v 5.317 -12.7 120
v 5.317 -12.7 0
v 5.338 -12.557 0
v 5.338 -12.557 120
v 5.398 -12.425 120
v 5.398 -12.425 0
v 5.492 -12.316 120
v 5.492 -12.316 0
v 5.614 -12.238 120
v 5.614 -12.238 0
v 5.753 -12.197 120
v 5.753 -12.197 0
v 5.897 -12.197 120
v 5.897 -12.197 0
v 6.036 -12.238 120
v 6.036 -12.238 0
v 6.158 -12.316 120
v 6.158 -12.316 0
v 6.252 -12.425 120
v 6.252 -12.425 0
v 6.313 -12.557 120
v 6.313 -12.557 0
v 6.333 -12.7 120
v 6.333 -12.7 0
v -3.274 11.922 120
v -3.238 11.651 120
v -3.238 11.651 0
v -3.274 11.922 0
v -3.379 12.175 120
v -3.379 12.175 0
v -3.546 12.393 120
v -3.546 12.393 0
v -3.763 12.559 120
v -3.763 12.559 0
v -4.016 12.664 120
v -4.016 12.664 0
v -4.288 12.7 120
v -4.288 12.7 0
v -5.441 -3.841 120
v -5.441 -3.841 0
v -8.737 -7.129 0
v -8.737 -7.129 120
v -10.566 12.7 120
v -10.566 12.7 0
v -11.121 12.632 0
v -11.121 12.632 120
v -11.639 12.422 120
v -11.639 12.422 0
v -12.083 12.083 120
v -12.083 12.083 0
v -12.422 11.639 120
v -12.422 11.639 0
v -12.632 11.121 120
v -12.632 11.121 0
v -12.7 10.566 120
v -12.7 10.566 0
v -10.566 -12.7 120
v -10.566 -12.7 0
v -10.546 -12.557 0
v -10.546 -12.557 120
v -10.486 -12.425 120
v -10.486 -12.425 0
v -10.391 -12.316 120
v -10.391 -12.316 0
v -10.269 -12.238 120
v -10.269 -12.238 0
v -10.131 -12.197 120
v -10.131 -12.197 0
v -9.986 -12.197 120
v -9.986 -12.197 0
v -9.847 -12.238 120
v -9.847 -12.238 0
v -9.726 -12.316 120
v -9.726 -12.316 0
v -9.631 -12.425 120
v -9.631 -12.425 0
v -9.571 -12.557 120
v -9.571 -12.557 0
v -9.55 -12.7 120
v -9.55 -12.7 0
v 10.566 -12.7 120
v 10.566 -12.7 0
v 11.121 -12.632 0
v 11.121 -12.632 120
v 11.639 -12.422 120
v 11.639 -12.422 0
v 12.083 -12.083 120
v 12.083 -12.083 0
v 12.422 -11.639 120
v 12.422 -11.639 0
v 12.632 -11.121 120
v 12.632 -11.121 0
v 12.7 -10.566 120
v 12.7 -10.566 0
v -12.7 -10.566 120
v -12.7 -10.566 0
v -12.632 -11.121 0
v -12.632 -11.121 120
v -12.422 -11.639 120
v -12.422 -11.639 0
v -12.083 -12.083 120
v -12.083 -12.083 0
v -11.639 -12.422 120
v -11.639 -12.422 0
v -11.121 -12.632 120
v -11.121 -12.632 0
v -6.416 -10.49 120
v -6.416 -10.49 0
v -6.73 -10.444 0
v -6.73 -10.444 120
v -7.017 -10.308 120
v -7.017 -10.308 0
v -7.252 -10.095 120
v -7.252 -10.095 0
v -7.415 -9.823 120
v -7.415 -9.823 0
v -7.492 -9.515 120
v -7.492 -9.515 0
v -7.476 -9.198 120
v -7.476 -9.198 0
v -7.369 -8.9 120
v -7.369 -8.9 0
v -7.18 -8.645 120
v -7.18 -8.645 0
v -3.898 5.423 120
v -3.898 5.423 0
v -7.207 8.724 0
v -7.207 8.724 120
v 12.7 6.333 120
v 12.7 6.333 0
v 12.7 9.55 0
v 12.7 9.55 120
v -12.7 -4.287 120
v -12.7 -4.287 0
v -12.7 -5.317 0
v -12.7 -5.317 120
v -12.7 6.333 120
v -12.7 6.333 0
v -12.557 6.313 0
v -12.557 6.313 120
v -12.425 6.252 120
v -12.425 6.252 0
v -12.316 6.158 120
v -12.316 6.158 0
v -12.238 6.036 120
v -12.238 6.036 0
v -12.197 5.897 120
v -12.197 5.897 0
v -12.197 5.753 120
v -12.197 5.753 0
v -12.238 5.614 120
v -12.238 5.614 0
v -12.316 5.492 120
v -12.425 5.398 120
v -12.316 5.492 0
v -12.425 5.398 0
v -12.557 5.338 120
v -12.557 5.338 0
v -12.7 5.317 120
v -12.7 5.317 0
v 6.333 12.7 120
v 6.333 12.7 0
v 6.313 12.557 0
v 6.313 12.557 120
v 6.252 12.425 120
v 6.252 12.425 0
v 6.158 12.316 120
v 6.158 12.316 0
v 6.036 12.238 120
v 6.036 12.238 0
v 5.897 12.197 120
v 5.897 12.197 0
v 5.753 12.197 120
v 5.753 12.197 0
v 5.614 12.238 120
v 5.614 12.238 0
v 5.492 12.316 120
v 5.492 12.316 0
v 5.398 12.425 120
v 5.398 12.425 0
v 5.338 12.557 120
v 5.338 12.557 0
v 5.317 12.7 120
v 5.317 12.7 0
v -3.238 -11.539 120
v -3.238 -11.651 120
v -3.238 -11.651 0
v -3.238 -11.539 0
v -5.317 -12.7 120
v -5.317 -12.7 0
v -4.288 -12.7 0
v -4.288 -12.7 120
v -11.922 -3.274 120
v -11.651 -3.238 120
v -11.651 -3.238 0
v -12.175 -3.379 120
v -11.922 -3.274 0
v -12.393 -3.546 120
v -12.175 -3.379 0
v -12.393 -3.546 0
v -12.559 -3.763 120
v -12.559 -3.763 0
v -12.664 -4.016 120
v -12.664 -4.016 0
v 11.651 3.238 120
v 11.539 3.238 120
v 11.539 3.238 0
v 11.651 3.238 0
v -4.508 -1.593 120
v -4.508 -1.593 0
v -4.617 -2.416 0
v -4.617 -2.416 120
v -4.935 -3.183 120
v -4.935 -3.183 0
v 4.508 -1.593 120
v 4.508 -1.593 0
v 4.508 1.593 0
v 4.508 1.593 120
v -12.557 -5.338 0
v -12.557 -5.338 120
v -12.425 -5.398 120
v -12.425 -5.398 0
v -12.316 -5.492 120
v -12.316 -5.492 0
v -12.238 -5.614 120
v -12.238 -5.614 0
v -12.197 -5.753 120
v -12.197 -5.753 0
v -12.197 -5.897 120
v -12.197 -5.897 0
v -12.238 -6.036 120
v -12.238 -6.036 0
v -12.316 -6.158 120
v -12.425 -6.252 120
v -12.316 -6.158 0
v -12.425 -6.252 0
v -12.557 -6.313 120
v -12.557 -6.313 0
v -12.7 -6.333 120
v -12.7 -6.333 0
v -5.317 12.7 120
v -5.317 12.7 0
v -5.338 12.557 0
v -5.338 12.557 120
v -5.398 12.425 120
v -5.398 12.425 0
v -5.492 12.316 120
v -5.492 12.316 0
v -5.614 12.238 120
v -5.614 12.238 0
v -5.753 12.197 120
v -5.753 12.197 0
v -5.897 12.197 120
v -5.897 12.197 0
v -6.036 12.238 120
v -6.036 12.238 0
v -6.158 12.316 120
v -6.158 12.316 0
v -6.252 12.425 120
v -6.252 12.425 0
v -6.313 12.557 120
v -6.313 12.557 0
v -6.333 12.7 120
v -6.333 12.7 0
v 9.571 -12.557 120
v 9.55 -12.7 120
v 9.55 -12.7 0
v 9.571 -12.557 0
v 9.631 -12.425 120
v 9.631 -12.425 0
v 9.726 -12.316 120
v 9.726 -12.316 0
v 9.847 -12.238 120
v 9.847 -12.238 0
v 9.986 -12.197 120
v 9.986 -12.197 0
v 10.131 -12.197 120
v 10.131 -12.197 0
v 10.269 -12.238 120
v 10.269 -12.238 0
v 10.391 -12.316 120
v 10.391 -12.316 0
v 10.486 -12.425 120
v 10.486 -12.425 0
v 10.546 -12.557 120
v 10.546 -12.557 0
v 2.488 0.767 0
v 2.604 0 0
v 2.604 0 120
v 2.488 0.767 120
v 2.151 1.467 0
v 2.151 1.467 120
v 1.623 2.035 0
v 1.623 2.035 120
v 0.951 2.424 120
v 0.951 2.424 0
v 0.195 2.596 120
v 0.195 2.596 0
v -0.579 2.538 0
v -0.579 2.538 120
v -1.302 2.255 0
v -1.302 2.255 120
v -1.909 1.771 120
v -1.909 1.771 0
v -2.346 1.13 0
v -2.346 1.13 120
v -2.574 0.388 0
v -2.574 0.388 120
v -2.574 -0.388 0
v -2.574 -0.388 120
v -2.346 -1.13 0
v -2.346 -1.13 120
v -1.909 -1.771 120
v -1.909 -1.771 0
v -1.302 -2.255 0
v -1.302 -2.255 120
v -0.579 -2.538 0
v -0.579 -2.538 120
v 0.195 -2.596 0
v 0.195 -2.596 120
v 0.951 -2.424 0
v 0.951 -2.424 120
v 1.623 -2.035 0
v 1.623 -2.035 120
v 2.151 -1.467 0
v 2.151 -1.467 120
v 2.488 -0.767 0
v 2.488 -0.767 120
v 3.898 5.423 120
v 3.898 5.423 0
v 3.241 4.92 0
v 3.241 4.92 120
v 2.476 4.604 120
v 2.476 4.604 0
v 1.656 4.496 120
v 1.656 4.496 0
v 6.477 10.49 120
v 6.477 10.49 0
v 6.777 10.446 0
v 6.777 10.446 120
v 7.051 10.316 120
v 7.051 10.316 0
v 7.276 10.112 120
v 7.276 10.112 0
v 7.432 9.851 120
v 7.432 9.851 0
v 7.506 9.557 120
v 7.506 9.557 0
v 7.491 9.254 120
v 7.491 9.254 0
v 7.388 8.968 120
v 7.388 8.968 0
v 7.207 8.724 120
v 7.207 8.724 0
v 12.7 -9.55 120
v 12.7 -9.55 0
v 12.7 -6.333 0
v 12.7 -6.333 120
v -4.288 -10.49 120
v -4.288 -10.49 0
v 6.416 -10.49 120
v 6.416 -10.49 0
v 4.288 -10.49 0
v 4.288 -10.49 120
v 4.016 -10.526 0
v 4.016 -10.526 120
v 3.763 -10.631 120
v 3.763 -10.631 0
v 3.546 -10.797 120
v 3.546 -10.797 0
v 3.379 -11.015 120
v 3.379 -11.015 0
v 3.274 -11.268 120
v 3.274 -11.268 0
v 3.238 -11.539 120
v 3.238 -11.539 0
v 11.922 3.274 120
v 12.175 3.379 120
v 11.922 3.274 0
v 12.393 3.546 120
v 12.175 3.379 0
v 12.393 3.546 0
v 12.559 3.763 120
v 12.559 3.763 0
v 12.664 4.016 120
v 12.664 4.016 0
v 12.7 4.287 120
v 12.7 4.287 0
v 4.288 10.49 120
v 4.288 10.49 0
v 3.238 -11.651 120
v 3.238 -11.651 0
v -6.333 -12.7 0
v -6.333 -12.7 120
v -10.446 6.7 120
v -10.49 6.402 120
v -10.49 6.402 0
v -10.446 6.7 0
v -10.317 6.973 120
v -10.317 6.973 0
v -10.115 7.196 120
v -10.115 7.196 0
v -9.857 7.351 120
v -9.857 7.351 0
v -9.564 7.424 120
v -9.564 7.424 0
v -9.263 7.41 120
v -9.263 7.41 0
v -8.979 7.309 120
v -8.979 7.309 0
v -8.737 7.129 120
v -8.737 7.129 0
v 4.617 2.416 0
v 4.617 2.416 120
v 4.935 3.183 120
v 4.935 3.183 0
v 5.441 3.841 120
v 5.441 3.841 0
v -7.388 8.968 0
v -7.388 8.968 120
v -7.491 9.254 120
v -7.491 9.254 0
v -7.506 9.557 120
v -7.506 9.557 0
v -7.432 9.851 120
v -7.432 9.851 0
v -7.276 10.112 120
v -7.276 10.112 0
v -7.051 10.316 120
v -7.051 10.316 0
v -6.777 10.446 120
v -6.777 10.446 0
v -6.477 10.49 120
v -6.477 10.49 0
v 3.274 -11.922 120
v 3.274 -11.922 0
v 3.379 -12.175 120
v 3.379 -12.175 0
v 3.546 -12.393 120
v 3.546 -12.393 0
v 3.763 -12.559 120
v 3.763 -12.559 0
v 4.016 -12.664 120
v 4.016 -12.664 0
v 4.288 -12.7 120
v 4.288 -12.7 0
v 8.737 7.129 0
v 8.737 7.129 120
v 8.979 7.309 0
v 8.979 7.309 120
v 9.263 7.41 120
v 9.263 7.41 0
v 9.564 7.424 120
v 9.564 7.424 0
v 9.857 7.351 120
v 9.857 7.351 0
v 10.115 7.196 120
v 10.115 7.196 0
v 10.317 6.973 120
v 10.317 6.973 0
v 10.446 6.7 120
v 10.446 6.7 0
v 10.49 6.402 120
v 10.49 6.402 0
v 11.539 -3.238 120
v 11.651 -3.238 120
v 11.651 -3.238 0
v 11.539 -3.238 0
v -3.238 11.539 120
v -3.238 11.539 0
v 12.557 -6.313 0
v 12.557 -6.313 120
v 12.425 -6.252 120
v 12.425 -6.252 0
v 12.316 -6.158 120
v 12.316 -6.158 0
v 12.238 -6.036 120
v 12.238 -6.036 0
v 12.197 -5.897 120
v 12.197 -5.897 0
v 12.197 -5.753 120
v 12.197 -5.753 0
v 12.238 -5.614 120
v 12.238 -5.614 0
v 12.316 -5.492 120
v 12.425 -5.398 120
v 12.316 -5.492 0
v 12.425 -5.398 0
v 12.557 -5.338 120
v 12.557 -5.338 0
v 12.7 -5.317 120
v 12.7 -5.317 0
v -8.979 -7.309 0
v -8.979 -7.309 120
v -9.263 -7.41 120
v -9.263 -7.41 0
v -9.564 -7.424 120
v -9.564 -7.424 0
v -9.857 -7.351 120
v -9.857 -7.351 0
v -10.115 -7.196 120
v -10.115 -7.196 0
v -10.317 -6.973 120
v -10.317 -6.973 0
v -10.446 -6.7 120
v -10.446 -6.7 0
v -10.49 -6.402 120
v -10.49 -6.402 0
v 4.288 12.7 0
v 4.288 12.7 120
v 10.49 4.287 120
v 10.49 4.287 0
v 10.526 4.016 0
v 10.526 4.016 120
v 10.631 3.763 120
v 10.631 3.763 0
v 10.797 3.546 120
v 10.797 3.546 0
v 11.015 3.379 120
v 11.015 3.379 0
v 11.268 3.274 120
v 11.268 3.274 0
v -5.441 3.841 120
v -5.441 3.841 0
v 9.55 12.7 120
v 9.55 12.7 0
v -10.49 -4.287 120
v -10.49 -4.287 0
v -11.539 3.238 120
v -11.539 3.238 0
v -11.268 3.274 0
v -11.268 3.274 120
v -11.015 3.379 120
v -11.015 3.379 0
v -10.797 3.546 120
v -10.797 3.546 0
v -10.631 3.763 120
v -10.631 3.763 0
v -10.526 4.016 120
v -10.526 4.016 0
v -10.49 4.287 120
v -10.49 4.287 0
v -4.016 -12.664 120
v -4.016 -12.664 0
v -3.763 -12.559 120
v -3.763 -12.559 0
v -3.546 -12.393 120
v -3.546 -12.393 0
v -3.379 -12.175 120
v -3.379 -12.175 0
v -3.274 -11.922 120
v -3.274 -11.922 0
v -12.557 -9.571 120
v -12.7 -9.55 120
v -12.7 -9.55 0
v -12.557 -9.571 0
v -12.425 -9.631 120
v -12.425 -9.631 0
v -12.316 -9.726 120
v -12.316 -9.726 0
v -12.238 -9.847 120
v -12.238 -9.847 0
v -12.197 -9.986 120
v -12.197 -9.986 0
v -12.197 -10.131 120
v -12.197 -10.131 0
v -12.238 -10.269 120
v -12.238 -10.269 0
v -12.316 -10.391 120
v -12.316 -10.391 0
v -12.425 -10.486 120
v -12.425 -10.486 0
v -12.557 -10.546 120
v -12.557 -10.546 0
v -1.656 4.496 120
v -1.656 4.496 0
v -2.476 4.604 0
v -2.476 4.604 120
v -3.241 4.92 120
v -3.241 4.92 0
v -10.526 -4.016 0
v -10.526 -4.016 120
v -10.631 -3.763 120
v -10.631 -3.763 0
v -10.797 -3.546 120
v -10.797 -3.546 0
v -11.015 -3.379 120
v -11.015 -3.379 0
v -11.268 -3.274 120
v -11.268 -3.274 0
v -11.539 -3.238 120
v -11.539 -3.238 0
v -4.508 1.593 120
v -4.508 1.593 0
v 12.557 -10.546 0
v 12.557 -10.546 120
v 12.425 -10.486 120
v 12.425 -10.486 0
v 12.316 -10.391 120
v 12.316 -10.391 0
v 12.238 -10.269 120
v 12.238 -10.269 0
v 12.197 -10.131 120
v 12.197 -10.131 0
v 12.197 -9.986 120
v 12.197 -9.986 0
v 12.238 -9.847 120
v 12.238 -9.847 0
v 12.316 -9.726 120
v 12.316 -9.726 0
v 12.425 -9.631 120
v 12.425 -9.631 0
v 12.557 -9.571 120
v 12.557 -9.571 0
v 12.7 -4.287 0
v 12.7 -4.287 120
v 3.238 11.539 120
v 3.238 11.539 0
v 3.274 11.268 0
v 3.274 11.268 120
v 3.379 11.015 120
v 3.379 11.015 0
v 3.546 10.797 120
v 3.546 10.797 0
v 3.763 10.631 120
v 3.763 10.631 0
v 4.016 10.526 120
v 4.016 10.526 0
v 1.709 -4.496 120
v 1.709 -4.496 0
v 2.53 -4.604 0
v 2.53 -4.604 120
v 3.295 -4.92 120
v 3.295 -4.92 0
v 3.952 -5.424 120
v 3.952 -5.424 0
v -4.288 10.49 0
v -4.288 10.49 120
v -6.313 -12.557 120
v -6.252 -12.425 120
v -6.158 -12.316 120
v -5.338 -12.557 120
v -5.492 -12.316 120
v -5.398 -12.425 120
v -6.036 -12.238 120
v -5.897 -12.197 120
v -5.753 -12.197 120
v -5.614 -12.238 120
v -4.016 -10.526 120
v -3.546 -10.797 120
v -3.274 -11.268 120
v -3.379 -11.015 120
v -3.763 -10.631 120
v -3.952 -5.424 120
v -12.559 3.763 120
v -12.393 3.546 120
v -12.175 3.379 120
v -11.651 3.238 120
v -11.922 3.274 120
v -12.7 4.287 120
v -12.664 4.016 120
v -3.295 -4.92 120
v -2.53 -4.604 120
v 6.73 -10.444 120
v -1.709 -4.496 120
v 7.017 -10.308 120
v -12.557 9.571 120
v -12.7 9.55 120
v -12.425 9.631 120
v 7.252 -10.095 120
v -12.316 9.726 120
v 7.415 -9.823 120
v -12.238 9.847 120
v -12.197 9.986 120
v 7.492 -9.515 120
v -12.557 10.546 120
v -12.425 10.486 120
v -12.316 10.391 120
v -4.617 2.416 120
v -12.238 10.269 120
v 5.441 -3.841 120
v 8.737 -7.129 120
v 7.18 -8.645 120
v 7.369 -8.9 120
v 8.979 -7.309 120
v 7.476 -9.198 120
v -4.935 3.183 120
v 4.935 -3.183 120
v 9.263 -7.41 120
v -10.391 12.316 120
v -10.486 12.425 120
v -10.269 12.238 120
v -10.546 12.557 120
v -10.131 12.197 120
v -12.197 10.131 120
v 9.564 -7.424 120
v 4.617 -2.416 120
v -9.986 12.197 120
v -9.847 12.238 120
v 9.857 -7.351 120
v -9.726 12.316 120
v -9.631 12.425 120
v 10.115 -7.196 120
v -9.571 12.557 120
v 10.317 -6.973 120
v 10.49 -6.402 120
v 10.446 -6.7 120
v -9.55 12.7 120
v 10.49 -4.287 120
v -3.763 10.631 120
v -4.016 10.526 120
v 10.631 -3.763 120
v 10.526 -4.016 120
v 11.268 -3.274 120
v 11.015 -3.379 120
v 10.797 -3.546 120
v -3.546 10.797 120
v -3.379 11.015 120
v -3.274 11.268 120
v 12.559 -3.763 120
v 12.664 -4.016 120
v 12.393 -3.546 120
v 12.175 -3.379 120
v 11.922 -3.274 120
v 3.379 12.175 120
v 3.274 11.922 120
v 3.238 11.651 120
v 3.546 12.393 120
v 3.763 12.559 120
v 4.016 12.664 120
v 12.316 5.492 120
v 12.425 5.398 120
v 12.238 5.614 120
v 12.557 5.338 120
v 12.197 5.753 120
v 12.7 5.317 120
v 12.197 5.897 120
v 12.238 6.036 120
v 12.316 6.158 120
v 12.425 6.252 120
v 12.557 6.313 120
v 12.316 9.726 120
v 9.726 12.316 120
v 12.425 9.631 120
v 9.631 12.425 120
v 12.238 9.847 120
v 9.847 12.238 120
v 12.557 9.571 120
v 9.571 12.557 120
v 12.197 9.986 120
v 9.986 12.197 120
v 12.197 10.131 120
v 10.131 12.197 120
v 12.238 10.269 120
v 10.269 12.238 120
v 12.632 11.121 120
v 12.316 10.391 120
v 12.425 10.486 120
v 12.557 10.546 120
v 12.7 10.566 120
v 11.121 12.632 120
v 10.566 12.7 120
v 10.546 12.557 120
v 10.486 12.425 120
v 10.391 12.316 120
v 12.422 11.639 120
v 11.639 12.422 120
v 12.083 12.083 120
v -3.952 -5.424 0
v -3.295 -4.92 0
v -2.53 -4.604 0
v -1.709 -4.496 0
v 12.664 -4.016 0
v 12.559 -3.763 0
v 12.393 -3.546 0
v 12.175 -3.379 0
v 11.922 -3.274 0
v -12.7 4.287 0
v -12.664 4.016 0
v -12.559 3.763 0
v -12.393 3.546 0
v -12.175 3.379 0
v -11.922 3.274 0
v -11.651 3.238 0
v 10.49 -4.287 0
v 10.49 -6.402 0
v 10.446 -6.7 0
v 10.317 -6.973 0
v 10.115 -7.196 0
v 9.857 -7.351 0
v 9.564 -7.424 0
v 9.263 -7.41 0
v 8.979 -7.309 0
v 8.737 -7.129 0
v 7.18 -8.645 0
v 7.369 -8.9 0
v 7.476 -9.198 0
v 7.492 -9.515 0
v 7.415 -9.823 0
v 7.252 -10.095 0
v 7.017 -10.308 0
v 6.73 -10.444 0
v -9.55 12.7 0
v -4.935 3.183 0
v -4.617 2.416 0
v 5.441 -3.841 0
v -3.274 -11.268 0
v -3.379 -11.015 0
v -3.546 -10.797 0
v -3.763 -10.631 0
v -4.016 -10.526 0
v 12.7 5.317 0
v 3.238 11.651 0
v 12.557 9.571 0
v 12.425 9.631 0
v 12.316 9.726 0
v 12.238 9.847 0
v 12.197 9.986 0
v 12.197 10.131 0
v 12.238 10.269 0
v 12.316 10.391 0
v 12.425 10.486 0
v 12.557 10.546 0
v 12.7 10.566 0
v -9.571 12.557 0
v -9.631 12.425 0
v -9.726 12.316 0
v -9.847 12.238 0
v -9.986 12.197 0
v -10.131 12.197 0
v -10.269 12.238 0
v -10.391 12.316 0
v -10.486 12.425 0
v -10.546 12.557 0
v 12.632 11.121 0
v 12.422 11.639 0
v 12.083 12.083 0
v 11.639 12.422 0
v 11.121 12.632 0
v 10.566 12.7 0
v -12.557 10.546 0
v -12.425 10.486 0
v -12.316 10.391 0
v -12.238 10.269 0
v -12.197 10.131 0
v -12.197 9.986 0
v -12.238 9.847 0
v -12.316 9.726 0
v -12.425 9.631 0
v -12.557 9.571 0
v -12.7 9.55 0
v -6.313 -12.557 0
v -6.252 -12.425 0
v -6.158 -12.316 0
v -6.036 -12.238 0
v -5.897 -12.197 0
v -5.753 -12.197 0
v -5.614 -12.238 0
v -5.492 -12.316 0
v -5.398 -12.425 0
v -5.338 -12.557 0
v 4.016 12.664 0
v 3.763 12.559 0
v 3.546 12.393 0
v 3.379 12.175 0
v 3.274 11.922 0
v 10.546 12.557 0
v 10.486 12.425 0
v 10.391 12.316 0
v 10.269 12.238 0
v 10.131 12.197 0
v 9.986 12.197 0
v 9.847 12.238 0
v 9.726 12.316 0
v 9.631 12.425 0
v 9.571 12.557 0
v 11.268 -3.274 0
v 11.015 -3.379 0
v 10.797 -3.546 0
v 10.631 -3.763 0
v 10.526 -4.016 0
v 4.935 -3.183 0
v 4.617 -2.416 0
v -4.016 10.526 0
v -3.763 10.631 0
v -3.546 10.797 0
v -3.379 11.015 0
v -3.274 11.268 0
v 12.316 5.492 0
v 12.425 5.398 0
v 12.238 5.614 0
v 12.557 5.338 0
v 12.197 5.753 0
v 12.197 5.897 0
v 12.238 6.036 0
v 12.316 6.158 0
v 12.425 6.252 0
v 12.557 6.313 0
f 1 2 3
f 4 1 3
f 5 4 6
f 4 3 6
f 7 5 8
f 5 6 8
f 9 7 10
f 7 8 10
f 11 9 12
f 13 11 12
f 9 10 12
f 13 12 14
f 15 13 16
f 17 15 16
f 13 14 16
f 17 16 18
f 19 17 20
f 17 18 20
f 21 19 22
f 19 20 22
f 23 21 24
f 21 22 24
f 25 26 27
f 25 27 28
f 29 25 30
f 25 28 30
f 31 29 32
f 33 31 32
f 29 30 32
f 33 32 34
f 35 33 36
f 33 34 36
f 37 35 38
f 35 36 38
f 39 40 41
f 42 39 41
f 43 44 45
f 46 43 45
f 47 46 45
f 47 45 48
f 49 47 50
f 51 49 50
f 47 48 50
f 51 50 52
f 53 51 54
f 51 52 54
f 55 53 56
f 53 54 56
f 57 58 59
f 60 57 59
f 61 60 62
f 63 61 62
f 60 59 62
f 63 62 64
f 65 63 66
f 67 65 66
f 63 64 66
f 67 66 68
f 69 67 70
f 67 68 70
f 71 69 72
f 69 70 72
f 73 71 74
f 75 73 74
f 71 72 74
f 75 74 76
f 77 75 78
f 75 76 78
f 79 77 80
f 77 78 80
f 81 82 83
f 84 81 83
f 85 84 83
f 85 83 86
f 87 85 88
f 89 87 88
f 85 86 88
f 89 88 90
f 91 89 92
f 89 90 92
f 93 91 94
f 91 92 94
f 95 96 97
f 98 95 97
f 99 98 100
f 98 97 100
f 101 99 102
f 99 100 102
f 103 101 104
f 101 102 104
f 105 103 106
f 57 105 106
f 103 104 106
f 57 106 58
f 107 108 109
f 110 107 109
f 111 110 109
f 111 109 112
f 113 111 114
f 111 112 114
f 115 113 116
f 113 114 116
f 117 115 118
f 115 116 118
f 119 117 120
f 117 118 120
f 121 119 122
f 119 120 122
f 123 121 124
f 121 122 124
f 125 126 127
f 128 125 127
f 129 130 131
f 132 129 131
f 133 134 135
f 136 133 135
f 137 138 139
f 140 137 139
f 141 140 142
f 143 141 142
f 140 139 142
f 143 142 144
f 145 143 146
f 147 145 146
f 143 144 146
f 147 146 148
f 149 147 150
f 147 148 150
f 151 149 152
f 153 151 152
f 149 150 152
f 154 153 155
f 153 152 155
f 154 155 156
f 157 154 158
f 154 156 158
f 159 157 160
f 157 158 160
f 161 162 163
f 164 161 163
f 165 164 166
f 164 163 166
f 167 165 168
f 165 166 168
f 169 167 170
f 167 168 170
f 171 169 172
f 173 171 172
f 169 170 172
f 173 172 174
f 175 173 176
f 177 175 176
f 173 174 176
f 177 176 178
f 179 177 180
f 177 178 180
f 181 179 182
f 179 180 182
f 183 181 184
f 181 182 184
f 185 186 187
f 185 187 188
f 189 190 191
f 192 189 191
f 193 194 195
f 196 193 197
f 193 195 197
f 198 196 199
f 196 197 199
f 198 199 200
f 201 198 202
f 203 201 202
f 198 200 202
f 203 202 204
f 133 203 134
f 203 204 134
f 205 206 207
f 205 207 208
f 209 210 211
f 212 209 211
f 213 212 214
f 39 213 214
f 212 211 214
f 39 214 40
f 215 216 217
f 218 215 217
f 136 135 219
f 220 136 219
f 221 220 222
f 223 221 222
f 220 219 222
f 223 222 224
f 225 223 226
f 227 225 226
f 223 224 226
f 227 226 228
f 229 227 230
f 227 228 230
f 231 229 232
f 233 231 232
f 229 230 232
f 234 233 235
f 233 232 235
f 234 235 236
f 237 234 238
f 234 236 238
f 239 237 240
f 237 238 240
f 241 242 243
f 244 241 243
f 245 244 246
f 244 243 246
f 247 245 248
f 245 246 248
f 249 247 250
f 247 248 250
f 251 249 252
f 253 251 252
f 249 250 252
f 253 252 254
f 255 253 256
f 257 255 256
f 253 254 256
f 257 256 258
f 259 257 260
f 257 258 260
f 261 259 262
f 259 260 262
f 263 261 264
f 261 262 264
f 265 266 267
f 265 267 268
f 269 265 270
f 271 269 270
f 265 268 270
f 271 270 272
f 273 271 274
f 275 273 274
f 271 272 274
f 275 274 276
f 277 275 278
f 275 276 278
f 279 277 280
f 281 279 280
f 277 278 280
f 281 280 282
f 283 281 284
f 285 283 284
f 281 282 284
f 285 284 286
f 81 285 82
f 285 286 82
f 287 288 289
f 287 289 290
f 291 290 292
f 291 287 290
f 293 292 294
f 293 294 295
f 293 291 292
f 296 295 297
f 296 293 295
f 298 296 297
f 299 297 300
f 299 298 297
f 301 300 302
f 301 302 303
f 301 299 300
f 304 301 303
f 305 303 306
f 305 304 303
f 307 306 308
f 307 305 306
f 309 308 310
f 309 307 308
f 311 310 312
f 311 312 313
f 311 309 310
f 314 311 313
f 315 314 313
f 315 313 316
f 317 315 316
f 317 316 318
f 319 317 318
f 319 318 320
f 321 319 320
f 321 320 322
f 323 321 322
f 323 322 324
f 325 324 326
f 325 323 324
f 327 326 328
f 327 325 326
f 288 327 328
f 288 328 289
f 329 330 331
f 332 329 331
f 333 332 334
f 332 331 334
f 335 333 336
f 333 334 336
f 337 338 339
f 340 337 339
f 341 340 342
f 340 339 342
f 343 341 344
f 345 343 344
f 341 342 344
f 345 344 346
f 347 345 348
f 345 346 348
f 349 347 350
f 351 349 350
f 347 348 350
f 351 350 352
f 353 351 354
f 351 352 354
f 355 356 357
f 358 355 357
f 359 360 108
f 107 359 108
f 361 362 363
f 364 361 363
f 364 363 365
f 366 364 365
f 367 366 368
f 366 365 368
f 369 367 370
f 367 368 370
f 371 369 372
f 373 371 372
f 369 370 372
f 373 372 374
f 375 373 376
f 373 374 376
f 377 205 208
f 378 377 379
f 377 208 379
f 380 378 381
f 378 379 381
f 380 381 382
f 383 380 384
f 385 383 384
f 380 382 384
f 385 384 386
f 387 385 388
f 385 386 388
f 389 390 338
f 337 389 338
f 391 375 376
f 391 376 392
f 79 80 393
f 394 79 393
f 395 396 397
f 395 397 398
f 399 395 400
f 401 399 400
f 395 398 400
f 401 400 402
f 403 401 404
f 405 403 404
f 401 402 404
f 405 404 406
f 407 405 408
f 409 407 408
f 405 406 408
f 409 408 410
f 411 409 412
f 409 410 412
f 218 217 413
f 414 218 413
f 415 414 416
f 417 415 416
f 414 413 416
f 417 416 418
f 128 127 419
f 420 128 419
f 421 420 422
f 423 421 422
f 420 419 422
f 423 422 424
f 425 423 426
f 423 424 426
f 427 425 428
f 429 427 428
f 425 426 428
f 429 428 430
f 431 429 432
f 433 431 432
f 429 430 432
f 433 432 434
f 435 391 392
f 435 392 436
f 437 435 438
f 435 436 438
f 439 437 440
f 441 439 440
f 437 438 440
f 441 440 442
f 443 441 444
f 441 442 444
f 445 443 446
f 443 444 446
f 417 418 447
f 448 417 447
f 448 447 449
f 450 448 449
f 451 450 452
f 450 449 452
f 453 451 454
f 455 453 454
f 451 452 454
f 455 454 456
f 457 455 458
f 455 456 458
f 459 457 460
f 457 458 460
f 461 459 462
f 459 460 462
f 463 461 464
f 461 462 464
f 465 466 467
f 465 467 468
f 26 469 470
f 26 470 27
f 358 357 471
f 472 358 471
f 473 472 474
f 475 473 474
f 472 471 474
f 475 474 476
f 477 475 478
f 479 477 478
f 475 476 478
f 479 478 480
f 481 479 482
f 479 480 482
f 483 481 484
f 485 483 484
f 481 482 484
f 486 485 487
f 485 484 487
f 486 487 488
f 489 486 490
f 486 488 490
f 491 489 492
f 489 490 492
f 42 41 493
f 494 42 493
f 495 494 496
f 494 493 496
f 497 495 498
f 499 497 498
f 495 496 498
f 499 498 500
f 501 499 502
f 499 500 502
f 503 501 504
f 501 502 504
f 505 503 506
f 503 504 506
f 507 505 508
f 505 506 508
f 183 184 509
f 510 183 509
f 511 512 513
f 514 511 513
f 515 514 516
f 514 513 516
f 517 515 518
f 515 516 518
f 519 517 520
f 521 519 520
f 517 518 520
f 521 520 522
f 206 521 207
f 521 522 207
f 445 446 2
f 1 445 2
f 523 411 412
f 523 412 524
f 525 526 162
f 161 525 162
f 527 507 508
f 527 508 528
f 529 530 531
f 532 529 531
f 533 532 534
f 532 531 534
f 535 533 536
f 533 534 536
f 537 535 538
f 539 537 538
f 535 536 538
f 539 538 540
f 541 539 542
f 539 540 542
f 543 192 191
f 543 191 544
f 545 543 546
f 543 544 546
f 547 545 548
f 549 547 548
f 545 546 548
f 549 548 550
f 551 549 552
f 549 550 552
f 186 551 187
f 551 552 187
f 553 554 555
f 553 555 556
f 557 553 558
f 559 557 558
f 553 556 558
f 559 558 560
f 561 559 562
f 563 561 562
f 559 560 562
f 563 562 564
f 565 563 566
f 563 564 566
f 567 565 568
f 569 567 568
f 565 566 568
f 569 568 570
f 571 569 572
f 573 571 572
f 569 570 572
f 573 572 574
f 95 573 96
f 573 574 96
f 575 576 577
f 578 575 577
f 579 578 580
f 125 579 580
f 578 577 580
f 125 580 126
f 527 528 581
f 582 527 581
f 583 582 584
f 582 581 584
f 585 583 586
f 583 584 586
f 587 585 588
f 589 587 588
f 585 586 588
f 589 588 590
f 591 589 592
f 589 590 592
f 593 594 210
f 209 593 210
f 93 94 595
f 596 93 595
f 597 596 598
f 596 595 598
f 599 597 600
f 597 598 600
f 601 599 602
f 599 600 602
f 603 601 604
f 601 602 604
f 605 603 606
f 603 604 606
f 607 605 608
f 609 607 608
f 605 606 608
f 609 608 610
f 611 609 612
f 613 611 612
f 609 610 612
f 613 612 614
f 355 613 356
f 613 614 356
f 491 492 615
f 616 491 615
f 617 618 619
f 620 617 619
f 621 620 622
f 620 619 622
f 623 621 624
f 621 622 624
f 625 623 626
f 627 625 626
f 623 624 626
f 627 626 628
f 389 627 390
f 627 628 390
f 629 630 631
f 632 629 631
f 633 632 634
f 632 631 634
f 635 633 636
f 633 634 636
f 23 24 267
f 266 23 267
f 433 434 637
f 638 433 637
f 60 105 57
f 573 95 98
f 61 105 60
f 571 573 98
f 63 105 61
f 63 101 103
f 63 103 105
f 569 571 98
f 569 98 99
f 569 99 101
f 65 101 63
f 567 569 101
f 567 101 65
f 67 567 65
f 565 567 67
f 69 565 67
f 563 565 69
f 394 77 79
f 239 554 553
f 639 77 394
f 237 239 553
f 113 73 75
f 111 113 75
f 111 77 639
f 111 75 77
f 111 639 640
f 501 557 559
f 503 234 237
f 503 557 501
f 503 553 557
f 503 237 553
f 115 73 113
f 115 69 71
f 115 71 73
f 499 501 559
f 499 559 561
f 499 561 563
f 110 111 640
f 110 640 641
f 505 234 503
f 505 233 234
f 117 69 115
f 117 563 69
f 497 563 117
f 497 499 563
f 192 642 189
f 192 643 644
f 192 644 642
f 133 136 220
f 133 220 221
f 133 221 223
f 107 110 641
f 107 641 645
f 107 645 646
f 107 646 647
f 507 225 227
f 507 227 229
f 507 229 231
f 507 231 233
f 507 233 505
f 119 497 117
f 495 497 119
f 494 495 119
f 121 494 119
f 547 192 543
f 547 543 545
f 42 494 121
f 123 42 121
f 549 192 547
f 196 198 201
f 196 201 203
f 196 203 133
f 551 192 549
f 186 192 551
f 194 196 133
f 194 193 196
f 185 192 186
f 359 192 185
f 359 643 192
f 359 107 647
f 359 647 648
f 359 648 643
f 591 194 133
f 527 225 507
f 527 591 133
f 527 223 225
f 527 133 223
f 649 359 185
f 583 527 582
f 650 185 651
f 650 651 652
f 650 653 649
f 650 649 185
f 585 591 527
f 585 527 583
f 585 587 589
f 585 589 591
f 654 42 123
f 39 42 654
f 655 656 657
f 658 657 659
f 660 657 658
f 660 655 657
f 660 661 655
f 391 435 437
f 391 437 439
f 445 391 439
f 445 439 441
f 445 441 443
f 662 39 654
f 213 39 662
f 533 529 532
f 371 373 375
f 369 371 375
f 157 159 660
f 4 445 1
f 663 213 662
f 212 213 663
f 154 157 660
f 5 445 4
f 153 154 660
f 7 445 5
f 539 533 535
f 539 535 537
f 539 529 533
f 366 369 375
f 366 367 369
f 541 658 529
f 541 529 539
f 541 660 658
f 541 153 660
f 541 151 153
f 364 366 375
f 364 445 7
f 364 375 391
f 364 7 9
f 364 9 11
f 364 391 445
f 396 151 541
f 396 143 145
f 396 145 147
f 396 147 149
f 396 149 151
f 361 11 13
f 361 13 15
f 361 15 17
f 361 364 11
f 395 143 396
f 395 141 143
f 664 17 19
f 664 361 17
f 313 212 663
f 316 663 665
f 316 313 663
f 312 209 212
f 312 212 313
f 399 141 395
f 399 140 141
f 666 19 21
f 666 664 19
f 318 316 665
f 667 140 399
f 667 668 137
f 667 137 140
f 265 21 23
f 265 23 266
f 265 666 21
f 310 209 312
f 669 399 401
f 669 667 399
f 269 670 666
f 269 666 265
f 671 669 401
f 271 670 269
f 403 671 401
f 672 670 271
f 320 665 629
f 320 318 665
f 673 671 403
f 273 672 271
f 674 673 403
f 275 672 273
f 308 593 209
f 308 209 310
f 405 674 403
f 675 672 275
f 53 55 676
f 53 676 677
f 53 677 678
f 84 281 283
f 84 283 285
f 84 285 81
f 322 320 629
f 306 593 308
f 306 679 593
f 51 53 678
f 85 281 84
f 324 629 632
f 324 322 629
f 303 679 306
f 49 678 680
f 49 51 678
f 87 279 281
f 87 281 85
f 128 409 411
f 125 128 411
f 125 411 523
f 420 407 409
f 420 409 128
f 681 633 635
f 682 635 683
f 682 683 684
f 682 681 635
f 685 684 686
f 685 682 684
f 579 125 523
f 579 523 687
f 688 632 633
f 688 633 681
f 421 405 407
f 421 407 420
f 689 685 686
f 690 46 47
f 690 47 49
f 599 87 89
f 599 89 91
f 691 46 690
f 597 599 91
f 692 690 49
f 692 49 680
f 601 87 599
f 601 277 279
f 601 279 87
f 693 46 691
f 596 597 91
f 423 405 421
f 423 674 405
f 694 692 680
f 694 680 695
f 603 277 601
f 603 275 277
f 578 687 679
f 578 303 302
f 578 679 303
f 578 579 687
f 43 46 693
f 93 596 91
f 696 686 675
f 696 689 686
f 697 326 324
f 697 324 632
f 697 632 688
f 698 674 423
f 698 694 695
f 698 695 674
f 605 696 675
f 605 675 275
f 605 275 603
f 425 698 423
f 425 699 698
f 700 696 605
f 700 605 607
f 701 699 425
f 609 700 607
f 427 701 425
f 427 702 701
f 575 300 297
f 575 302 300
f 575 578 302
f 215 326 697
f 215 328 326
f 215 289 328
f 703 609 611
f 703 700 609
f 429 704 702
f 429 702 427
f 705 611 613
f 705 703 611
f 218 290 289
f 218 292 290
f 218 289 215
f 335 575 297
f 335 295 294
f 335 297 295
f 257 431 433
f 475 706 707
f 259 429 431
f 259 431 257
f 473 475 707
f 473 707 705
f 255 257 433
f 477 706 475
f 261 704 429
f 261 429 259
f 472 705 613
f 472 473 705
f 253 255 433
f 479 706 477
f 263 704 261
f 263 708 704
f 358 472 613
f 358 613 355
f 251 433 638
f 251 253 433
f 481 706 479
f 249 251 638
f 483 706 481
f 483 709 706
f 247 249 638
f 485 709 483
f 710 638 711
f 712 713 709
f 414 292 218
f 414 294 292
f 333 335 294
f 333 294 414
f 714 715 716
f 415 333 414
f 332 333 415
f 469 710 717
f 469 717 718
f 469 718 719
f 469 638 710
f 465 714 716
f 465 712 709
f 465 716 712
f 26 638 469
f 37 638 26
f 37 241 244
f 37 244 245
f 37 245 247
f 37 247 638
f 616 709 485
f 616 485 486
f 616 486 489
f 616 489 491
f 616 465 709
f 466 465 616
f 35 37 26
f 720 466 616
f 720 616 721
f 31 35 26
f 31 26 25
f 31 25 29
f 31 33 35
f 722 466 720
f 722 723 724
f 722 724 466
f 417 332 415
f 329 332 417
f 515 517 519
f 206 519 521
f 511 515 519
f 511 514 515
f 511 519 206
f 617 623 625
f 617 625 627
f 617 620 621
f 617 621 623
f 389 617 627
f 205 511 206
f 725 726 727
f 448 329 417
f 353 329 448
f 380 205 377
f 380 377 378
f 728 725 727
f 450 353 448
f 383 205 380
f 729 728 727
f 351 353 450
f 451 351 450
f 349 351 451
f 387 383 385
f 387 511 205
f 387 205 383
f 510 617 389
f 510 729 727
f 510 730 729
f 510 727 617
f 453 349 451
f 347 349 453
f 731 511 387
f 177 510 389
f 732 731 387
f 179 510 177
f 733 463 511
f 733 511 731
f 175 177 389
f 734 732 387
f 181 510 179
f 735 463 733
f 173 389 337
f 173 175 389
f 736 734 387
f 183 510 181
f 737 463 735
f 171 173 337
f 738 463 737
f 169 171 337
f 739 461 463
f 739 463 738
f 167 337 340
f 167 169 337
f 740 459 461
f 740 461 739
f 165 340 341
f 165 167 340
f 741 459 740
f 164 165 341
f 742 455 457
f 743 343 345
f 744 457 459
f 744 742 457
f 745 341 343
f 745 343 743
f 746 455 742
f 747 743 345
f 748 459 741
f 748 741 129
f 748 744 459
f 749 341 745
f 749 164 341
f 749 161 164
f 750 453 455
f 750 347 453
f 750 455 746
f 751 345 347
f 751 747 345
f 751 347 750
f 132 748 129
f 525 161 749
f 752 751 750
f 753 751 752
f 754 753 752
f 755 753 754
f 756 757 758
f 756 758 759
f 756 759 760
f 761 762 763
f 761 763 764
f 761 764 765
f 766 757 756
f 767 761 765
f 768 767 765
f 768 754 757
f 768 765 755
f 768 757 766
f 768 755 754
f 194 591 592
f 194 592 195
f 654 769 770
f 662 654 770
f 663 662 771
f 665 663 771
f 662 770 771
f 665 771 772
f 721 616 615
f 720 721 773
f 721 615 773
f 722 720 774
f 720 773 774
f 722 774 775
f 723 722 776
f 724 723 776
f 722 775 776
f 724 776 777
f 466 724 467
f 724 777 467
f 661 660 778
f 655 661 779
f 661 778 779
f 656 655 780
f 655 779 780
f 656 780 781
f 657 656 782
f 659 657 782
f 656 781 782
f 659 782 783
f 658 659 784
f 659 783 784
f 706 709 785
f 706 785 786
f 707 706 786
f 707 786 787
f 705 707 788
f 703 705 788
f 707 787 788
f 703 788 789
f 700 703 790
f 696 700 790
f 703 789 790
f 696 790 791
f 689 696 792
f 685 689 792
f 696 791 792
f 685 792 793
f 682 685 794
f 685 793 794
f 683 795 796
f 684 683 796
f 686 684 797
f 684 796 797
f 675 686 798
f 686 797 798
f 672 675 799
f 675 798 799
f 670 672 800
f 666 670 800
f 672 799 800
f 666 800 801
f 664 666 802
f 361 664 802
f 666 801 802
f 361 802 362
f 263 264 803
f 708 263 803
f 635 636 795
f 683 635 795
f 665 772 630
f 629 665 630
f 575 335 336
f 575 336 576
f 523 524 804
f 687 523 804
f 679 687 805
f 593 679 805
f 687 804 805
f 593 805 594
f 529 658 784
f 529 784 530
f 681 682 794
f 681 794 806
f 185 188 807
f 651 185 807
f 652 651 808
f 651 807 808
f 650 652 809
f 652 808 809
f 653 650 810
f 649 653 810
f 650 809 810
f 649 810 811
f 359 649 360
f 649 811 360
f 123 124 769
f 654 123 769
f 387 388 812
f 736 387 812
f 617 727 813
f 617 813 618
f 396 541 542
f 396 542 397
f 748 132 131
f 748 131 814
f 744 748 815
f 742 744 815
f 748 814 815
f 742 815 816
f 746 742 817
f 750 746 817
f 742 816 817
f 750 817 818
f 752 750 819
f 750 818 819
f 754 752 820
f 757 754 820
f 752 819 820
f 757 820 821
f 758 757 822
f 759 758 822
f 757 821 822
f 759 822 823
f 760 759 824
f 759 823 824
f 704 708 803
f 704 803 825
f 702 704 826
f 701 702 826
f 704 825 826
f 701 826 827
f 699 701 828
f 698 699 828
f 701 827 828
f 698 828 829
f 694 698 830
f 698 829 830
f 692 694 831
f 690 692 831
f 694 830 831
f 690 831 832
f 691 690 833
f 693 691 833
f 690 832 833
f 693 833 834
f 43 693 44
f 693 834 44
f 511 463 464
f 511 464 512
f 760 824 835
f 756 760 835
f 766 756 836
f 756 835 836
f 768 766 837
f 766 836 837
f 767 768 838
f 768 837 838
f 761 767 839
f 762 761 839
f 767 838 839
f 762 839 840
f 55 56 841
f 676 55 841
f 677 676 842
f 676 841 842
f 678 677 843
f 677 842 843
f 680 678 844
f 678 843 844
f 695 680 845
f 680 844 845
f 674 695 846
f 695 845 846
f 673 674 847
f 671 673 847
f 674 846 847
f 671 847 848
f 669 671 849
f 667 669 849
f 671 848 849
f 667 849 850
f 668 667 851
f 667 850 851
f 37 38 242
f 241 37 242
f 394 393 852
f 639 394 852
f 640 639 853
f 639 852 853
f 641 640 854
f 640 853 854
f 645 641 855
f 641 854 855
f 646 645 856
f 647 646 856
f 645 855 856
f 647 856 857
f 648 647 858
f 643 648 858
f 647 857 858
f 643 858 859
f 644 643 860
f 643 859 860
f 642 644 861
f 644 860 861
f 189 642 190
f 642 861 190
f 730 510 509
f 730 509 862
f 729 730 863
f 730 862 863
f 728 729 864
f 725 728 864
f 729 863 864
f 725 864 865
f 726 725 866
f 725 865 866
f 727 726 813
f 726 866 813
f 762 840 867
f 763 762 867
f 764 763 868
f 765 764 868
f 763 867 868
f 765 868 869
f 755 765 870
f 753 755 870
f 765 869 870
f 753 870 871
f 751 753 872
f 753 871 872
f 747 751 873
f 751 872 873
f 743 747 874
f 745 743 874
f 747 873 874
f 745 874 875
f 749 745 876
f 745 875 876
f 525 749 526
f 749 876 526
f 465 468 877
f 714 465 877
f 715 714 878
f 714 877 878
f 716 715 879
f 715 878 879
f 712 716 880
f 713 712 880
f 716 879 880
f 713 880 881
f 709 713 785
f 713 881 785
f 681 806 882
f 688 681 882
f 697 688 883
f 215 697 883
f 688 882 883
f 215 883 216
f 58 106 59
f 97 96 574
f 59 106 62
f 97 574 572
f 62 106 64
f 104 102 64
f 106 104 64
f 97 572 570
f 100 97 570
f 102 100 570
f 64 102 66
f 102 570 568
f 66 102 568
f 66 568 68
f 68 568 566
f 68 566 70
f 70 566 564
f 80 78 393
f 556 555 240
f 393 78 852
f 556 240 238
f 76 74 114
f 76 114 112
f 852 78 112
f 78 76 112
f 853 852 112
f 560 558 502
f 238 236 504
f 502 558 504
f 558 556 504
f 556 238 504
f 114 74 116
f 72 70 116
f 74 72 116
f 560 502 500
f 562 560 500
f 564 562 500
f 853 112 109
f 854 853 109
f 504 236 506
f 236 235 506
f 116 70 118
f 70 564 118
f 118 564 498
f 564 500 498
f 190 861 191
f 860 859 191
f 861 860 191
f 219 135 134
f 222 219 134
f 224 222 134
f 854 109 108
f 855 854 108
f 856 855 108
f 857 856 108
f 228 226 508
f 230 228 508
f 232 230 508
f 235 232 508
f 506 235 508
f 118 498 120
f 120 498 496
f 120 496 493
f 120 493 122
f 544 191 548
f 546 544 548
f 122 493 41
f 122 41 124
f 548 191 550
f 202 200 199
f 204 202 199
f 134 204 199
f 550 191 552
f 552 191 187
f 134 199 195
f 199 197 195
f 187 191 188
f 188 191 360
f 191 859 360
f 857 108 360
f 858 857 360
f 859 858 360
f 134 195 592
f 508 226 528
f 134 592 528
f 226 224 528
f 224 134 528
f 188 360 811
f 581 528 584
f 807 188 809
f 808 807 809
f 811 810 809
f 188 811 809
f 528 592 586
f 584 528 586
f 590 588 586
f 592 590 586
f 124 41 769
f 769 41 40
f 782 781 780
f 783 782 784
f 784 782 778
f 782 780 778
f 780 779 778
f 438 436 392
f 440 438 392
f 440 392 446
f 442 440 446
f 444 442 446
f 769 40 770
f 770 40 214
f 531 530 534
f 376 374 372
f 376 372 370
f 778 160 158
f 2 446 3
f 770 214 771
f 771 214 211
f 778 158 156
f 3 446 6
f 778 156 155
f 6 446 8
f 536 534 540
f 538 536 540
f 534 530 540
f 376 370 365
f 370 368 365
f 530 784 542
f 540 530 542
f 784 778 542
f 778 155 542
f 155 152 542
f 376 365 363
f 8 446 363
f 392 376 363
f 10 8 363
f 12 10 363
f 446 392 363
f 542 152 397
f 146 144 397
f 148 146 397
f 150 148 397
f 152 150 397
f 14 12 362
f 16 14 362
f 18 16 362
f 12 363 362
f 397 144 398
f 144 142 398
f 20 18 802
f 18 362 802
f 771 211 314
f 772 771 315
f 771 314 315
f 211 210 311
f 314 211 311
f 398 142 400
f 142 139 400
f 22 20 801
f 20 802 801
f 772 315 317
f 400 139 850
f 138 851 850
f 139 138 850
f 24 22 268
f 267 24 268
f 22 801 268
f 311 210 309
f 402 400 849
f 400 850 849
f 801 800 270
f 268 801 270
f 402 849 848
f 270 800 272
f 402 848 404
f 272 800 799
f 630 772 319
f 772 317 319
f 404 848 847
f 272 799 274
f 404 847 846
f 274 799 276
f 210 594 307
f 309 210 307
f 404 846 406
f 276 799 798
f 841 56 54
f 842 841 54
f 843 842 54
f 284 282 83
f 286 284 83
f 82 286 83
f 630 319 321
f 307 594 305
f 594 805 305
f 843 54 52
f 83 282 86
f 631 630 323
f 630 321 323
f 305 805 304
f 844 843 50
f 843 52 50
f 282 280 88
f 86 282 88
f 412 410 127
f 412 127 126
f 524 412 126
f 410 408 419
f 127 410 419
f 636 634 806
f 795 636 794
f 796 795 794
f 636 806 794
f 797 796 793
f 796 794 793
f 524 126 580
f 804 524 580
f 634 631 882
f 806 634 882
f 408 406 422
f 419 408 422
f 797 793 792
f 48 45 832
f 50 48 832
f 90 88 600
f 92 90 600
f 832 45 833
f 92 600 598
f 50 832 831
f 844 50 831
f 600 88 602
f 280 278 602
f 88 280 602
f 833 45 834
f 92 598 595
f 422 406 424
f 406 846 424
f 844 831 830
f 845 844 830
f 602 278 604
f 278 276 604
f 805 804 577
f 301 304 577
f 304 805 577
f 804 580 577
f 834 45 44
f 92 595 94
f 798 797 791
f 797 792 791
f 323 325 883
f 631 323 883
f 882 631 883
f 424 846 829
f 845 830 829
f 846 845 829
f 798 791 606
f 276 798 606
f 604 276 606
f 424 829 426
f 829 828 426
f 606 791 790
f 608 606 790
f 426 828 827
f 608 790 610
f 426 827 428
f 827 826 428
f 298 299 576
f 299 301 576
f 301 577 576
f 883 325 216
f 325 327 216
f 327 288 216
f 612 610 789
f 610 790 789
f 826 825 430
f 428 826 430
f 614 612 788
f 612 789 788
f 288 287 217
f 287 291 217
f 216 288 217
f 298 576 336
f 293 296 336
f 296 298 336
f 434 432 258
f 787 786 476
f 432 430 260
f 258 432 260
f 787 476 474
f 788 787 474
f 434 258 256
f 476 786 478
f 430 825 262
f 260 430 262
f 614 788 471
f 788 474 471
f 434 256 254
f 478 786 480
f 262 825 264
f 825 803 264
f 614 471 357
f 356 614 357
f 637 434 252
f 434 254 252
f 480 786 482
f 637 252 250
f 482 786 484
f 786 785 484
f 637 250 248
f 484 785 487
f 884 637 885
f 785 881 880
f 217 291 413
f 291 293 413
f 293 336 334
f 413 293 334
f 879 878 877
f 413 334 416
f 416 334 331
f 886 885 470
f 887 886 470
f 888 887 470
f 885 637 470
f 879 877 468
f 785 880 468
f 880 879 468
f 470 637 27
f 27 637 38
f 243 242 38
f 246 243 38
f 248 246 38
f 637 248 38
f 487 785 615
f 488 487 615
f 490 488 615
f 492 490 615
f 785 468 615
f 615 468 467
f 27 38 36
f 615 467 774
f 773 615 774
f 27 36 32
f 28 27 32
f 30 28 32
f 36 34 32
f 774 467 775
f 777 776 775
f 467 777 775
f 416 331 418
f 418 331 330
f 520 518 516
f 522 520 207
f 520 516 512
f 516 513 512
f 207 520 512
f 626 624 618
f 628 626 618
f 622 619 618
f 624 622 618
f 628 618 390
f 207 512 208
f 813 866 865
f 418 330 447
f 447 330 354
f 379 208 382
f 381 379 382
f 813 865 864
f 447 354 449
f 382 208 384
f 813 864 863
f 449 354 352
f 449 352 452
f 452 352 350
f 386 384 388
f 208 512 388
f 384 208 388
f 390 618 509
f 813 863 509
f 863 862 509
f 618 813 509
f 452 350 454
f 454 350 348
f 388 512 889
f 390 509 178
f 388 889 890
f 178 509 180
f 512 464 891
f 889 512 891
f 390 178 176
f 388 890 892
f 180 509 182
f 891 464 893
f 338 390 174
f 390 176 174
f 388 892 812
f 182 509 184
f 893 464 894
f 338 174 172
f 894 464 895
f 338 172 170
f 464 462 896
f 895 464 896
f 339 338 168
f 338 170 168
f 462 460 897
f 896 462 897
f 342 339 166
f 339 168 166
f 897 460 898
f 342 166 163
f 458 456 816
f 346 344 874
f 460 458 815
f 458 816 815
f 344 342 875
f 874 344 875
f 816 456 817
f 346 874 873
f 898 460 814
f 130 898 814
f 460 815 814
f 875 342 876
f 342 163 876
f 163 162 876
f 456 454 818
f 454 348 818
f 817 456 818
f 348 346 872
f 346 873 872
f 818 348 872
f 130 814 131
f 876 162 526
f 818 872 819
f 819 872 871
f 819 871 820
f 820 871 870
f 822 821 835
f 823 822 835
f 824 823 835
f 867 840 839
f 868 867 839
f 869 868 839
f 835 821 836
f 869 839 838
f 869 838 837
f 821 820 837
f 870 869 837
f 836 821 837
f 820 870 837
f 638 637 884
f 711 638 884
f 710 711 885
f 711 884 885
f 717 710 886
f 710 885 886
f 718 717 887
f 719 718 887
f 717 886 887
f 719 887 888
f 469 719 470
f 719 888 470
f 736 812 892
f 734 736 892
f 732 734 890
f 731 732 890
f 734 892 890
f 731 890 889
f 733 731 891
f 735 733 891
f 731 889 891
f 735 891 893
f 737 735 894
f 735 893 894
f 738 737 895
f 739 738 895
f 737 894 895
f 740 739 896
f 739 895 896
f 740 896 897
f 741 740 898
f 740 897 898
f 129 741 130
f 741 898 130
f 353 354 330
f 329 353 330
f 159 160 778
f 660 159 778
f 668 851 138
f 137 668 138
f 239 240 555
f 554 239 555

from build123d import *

# Parameters (mm, degrees)
F0_R     = 2.6035
F1_DEPTH = 120


# Not quite as in the source:
# - ends of sketch curves that miss each other by under 0.0002 mm in the source are joined


with BuildPart() as f1:
    # F0 (on Top) → F1 (new body)
    with BuildSketch(Plane.XY):
        with BuildLine():
            ThreePointArc((-3.9522606035, -5.4236922052), (-2.9229262099, -4.7369294977), (-1.7092422, -4.4958))
            Line((-1.7092422, -4.4958), (1.7092422, -4.4958))
            ThreePointArc((1.7092422, -4.4958), (2.9229262099, -4.7369294977), (3.9522606035, -5.4236922052))
            Line((3.9522606035, -5.4236922052), (7.1796402, -8.6451948))
            ThreePointArc((7.1796402, -8.6451948), (7.4147391594, -9.822808991), (6.416421, -10.4902))
            Line((6.416421, -10.4902), (4.28752, -10.4902))
            ThreePointArc((4.28752, -10.4902), (3.5457508444, -10.7974508444), (3.2385, -11.53922))
            Line((3.2385, -11.53922), (3.2385, -11.65098))
            ThreePointArc((3.2385, -11.65098), (3.5457508444, -12.3927491556), (4.28752, -12.7))
            Line((4.28752, -12.7), (5.3171344, -12.7))
            ThreePointArc((5.3171344, -12.7), (5.8251344, -12.192), (6.3331344, -12.7))
            Line((6.3331344, -12.7), (9.5504508, -12.7))
            ThreePointArc((9.5504508, -12.7), (10.0583746, -12.1920000057), (10.5664507771, -12.6998476))
            ThreePointArc((10.5664507771, -12.6998476), (12.0825404752, -12.0825045568), (12.6998469825, -10.5664000074))
            ThreePointArc((12.6998469825, -10.5664000074), (12.1920000057, -10.0583238), (12.7, -9.5504))
            Line((12.7, -9.5504), (12.7, -6.3330836))
            ThreePointArc((12.7, -6.3330836), (12.192, -5.8250836), (12.7, -5.3170836))
            Line((12.7, -5.3170836), (12.7, -4.2874692))
            ThreePointArc((12.7, -4.2874692), (12.3927491556, -3.5457000444), (11.65098, -3.2384492))
            Line((11.65098, -3.2384492), (11.53922, -3.2384492))
            ThreePointArc((11.53922, -3.2384492), (10.7974508444, -3.5457000444), (10.4902, -4.2874692))
            Line((10.4902, -4.2874692), (10.4902, -6.4020954))
            ThreePointArc((10.4902, -6.4020954), (9.8565053438, -7.3510699477), (8.7371366164, -7.1294051977))
            Line((8.7371366164, -7.1294051977), (5.4410102, -3.8408102))
            ThreePointArc((5.4410102, -3.8408102), (4.7508771577, -2.8098852335), (4.5085, -1.5931896))
            Line((4.5085, -1.5931896), (4.5085, 1.5931896))
            ThreePointArc((4.5085, 1.5931896), (4.7508771577, 2.8098852335), (5.4410028439, 3.840817573))
            Line((5.4410028439, 3.840817573), (8.7371428, 7.129399))
            ThreePointArc((8.7371428, 7.129399), (9.8565053438, 7.3510699477), (10.4902, 6.4020954))
            Line((10.4902, 6.4020954), (10.4902, 4.2874692))
            ThreePointArc((10.4902, 4.2874692), (10.7974508444, 3.5457000444), (11.53922, 3.2384492))
            Line((11.53922, 3.2384492), (11.65098, 3.2384492))
            ThreePointArc((11.65098, 3.2384492), (12.3927491556, 3.5457000444), (12.7, 4.2874692))
            Line((12.7, 4.2874692), (12.7, 5.3170836))
            ThreePointArc((12.7, 5.3170836), (12.192, 5.8250836), (12.7, 6.3330836))
            Line((12.7, 6.3330836), (12.7, 9.5504))
            ThreePointArc((12.7, 9.5504), (12.1920000057, 10.0583238), (12.6998476, 10.5663999771))
            ThreePointArc((12.6998476, 10.5663999771), (12.0825404752, 12.0825045568), (10.5664508001, 12.6998475939))
            ThreePointArc((10.5664508001, 12.6998475939), (10.0583746, 12.1920000057), (9.5504508, 12.7))
            Line((9.5504508, 12.7), (6.3331344, 12.7))
            ThreePointArc((6.3331344, 12.7), (5.8251344, 12.192), (5.3171344, 12.7))
            Line((5.3171344, 12.7), (4.28752, 12.7))
            ThreePointArc((4.28752, 12.7), (3.5457508444, 12.3927491556), (3.2385, 11.65098))
            Line((3.2385, 11.65098), (3.2385, 11.53922))
            ThreePointArc((3.2385, 11.53922), (3.5457508444, 10.7974508444), (4.28752, 10.4902))
            Line((4.28752, 10.4902), (6.4767968, 10.4902))
            ThreePointArc((6.4767968, 10.4902), (7.4322289723, 9.8514044384), (7.2070407772, 8.7243726366))
            Line((7.2070407772, 8.7243726366), (3.898265, 5.4231794))
            ThreePointArc((3.898265, 5.4231794), (2.8691189654, 4.7367887684), (1.6557752, 4.4958))
            Line((1.6557752, 4.4958), (-1.6557752, 4.4958))
            ThreePointArc((-1.6557752, 4.4958), (-2.8691189654, 4.7367887684), (-3.8982723561, 5.423172027))
            Line((-3.8982723561, 5.423172027), (-7.2070468, 8.7243666))
            ThreePointArc((-7.2070468, 8.7243666), (-7.4322289723, 9.8514044384), (-6.4767968, 10.4902))
            Line((-6.4767968, 10.4902), (-4.28752, 10.4902))
            ThreePointArc((-4.28752, 10.4902), (-3.5457508444, 10.7974508444), (-3.2385, 11.53922))
            Line((-3.2385, 11.53922), (-3.2385, 11.65098))
            ThreePointArc((-3.2385, 11.65098), (-3.5457508444, 12.3927491556), (-4.28752, 12.7))
            Line((-4.28752, 12.7), (-5.3171344, 12.7))
            ThreePointArc((-5.3171344, 12.7), (-5.8251344, 12.192), (-6.3331344, 12.7))
            Line((-6.3331344, 12.7), (-9.5504508, 12.7))
            ThreePointArc((-9.5504508, 12.7), (-10.0583746, 12.1920000057), (-10.5664507771, 12.6998476))
            ThreePointArc((-10.5664507771, 12.6998476), (-12.0825404752, 12.0825045568), (-12.6998469825, 10.5664000074))
            ThreePointArc((-12.6998469825, 10.5664000074), (-12.1920000057, 10.0583238), (-12.7, 9.5504))
            Line((-12.7, 9.5504), (-12.7, 6.3330836))
            ThreePointArc((-12.7, 6.3330836), (-12.192, 5.8250836), (-12.7, 5.3170836))
            Line((-12.7, 5.3170836), (-12.7, 4.2874692))
            ThreePointArc((-12.7, 4.2874692), (-12.3927491556, 3.5457000444), (-11.65098, 3.2384492))
            Line((-11.65098, 3.2384492), (-11.53922, 3.2384492))
            ThreePointArc((-11.53922, 3.2384492), (-10.7974508444, 3.5457000444), (-10.4902, 4.2874692))
            Line((-10.4902, 4.2874692), (-10.4902, 6.4020954))
            ThreePointArc((-10.4902, 6.4020954), (-9.8565053438, 7.3510699477), (-8.7371366164, 7.1294051977))
            Line((-8.7371366164, 7.1294051977), (-5.4410102, 3.8408102))
            ThreePointArc((-5.4410102, 3.8408102), (-4.7508771577, 2.8098852335), (-4.5085, 1.5931896))
            Line((-4.5085, 1.5931896), (-4.5085, -1.5931896))
            ThreePointArc((-4.5085, -1.5931896), (-4.7508771577, -2.8098852335), (-5.4410028439, -3.840817573))
            Line((-5.4410028439, -3.840817573), (-8.7371428, -7.129399))
            ThreePointArc((-8.7371428, -7.129399), (-9.8565053438, -7.3510699477), (-10.4902, -6.4020954))
            Line((-10.4902, -6.4020954), (-10.4902, -4.2874692))
            ThreePointArc((-10.4902, -4.2874692), (-10.7974508444, -3.5457000444), (-11.53922, -3.2384492))
            Line((-11.53922, -3.2384492), (-11.65098, -3.2384492))
            ThreePointArc((-11.65098, -3.2384492), (-12.3927491556, -3.5457000444), (-12.7, -4.2874692))
            Line((-12.7, -4.2874692), (-12.7, -5.3170836))
            ThreePointArc((-12.7, -5.3170836), (-12.192, -5.8250836), (-12.7, -6.3330836))
            Line((-12.7, -6.3330836), (-12.7, -9.5504))
            ThreePointArc((-12.7, -9.5504), (-12.1920000057, -10.0583238), (-12.6998476, -10.5663999771))
            ThreePointArc((-12.6998476, -10.5663999771), (-12.0825404752, -12.0825045568), (-10.5664508001, -12.6998475939))
            ThreePointArc((-10.5664508001, -12.6998475939), (-10.0583746, -12.1920000057), (-9.5504508, -12.7))
            Line((-9.5504508, -12.7), (-6.3331344, -12.7))
            ThreePointArc((-6.3331344, -12.7), (-5.8251344, -12.192), (-5.3171344, -12.7))
            Line((-5.3171344, -12.7), (-4.28752, -12.7))
            ThreePointArc((-4.28752, -12.7), (-3.5457508444, -12.3927491556), (-3.2385, -11.65098))
            Line((-3.2385, -11.65098), (-3.2385, -11.53922))
            ThreePointArc((-3.2385, -11.53922), (-3.5457508444, -10.7974508444), (-4.28752, -10.4902))
            Line((-4.28752, -10.4902), (-6.416421, -10.4902))
            ThreePointArc((-6.416421, -10.4902), (-7.4147391594, -9.822808991), (-7.1796418951, -8.6451931018))
            Line((-7.1796418951, -8.6451931018), (-3.9522606035, -5.4236922052))
        make_face()
        Circle(F0_R, mode=Mode.SUBTRACT)
    extrude(amount=F1_DEPTH)


solid = f1.part
